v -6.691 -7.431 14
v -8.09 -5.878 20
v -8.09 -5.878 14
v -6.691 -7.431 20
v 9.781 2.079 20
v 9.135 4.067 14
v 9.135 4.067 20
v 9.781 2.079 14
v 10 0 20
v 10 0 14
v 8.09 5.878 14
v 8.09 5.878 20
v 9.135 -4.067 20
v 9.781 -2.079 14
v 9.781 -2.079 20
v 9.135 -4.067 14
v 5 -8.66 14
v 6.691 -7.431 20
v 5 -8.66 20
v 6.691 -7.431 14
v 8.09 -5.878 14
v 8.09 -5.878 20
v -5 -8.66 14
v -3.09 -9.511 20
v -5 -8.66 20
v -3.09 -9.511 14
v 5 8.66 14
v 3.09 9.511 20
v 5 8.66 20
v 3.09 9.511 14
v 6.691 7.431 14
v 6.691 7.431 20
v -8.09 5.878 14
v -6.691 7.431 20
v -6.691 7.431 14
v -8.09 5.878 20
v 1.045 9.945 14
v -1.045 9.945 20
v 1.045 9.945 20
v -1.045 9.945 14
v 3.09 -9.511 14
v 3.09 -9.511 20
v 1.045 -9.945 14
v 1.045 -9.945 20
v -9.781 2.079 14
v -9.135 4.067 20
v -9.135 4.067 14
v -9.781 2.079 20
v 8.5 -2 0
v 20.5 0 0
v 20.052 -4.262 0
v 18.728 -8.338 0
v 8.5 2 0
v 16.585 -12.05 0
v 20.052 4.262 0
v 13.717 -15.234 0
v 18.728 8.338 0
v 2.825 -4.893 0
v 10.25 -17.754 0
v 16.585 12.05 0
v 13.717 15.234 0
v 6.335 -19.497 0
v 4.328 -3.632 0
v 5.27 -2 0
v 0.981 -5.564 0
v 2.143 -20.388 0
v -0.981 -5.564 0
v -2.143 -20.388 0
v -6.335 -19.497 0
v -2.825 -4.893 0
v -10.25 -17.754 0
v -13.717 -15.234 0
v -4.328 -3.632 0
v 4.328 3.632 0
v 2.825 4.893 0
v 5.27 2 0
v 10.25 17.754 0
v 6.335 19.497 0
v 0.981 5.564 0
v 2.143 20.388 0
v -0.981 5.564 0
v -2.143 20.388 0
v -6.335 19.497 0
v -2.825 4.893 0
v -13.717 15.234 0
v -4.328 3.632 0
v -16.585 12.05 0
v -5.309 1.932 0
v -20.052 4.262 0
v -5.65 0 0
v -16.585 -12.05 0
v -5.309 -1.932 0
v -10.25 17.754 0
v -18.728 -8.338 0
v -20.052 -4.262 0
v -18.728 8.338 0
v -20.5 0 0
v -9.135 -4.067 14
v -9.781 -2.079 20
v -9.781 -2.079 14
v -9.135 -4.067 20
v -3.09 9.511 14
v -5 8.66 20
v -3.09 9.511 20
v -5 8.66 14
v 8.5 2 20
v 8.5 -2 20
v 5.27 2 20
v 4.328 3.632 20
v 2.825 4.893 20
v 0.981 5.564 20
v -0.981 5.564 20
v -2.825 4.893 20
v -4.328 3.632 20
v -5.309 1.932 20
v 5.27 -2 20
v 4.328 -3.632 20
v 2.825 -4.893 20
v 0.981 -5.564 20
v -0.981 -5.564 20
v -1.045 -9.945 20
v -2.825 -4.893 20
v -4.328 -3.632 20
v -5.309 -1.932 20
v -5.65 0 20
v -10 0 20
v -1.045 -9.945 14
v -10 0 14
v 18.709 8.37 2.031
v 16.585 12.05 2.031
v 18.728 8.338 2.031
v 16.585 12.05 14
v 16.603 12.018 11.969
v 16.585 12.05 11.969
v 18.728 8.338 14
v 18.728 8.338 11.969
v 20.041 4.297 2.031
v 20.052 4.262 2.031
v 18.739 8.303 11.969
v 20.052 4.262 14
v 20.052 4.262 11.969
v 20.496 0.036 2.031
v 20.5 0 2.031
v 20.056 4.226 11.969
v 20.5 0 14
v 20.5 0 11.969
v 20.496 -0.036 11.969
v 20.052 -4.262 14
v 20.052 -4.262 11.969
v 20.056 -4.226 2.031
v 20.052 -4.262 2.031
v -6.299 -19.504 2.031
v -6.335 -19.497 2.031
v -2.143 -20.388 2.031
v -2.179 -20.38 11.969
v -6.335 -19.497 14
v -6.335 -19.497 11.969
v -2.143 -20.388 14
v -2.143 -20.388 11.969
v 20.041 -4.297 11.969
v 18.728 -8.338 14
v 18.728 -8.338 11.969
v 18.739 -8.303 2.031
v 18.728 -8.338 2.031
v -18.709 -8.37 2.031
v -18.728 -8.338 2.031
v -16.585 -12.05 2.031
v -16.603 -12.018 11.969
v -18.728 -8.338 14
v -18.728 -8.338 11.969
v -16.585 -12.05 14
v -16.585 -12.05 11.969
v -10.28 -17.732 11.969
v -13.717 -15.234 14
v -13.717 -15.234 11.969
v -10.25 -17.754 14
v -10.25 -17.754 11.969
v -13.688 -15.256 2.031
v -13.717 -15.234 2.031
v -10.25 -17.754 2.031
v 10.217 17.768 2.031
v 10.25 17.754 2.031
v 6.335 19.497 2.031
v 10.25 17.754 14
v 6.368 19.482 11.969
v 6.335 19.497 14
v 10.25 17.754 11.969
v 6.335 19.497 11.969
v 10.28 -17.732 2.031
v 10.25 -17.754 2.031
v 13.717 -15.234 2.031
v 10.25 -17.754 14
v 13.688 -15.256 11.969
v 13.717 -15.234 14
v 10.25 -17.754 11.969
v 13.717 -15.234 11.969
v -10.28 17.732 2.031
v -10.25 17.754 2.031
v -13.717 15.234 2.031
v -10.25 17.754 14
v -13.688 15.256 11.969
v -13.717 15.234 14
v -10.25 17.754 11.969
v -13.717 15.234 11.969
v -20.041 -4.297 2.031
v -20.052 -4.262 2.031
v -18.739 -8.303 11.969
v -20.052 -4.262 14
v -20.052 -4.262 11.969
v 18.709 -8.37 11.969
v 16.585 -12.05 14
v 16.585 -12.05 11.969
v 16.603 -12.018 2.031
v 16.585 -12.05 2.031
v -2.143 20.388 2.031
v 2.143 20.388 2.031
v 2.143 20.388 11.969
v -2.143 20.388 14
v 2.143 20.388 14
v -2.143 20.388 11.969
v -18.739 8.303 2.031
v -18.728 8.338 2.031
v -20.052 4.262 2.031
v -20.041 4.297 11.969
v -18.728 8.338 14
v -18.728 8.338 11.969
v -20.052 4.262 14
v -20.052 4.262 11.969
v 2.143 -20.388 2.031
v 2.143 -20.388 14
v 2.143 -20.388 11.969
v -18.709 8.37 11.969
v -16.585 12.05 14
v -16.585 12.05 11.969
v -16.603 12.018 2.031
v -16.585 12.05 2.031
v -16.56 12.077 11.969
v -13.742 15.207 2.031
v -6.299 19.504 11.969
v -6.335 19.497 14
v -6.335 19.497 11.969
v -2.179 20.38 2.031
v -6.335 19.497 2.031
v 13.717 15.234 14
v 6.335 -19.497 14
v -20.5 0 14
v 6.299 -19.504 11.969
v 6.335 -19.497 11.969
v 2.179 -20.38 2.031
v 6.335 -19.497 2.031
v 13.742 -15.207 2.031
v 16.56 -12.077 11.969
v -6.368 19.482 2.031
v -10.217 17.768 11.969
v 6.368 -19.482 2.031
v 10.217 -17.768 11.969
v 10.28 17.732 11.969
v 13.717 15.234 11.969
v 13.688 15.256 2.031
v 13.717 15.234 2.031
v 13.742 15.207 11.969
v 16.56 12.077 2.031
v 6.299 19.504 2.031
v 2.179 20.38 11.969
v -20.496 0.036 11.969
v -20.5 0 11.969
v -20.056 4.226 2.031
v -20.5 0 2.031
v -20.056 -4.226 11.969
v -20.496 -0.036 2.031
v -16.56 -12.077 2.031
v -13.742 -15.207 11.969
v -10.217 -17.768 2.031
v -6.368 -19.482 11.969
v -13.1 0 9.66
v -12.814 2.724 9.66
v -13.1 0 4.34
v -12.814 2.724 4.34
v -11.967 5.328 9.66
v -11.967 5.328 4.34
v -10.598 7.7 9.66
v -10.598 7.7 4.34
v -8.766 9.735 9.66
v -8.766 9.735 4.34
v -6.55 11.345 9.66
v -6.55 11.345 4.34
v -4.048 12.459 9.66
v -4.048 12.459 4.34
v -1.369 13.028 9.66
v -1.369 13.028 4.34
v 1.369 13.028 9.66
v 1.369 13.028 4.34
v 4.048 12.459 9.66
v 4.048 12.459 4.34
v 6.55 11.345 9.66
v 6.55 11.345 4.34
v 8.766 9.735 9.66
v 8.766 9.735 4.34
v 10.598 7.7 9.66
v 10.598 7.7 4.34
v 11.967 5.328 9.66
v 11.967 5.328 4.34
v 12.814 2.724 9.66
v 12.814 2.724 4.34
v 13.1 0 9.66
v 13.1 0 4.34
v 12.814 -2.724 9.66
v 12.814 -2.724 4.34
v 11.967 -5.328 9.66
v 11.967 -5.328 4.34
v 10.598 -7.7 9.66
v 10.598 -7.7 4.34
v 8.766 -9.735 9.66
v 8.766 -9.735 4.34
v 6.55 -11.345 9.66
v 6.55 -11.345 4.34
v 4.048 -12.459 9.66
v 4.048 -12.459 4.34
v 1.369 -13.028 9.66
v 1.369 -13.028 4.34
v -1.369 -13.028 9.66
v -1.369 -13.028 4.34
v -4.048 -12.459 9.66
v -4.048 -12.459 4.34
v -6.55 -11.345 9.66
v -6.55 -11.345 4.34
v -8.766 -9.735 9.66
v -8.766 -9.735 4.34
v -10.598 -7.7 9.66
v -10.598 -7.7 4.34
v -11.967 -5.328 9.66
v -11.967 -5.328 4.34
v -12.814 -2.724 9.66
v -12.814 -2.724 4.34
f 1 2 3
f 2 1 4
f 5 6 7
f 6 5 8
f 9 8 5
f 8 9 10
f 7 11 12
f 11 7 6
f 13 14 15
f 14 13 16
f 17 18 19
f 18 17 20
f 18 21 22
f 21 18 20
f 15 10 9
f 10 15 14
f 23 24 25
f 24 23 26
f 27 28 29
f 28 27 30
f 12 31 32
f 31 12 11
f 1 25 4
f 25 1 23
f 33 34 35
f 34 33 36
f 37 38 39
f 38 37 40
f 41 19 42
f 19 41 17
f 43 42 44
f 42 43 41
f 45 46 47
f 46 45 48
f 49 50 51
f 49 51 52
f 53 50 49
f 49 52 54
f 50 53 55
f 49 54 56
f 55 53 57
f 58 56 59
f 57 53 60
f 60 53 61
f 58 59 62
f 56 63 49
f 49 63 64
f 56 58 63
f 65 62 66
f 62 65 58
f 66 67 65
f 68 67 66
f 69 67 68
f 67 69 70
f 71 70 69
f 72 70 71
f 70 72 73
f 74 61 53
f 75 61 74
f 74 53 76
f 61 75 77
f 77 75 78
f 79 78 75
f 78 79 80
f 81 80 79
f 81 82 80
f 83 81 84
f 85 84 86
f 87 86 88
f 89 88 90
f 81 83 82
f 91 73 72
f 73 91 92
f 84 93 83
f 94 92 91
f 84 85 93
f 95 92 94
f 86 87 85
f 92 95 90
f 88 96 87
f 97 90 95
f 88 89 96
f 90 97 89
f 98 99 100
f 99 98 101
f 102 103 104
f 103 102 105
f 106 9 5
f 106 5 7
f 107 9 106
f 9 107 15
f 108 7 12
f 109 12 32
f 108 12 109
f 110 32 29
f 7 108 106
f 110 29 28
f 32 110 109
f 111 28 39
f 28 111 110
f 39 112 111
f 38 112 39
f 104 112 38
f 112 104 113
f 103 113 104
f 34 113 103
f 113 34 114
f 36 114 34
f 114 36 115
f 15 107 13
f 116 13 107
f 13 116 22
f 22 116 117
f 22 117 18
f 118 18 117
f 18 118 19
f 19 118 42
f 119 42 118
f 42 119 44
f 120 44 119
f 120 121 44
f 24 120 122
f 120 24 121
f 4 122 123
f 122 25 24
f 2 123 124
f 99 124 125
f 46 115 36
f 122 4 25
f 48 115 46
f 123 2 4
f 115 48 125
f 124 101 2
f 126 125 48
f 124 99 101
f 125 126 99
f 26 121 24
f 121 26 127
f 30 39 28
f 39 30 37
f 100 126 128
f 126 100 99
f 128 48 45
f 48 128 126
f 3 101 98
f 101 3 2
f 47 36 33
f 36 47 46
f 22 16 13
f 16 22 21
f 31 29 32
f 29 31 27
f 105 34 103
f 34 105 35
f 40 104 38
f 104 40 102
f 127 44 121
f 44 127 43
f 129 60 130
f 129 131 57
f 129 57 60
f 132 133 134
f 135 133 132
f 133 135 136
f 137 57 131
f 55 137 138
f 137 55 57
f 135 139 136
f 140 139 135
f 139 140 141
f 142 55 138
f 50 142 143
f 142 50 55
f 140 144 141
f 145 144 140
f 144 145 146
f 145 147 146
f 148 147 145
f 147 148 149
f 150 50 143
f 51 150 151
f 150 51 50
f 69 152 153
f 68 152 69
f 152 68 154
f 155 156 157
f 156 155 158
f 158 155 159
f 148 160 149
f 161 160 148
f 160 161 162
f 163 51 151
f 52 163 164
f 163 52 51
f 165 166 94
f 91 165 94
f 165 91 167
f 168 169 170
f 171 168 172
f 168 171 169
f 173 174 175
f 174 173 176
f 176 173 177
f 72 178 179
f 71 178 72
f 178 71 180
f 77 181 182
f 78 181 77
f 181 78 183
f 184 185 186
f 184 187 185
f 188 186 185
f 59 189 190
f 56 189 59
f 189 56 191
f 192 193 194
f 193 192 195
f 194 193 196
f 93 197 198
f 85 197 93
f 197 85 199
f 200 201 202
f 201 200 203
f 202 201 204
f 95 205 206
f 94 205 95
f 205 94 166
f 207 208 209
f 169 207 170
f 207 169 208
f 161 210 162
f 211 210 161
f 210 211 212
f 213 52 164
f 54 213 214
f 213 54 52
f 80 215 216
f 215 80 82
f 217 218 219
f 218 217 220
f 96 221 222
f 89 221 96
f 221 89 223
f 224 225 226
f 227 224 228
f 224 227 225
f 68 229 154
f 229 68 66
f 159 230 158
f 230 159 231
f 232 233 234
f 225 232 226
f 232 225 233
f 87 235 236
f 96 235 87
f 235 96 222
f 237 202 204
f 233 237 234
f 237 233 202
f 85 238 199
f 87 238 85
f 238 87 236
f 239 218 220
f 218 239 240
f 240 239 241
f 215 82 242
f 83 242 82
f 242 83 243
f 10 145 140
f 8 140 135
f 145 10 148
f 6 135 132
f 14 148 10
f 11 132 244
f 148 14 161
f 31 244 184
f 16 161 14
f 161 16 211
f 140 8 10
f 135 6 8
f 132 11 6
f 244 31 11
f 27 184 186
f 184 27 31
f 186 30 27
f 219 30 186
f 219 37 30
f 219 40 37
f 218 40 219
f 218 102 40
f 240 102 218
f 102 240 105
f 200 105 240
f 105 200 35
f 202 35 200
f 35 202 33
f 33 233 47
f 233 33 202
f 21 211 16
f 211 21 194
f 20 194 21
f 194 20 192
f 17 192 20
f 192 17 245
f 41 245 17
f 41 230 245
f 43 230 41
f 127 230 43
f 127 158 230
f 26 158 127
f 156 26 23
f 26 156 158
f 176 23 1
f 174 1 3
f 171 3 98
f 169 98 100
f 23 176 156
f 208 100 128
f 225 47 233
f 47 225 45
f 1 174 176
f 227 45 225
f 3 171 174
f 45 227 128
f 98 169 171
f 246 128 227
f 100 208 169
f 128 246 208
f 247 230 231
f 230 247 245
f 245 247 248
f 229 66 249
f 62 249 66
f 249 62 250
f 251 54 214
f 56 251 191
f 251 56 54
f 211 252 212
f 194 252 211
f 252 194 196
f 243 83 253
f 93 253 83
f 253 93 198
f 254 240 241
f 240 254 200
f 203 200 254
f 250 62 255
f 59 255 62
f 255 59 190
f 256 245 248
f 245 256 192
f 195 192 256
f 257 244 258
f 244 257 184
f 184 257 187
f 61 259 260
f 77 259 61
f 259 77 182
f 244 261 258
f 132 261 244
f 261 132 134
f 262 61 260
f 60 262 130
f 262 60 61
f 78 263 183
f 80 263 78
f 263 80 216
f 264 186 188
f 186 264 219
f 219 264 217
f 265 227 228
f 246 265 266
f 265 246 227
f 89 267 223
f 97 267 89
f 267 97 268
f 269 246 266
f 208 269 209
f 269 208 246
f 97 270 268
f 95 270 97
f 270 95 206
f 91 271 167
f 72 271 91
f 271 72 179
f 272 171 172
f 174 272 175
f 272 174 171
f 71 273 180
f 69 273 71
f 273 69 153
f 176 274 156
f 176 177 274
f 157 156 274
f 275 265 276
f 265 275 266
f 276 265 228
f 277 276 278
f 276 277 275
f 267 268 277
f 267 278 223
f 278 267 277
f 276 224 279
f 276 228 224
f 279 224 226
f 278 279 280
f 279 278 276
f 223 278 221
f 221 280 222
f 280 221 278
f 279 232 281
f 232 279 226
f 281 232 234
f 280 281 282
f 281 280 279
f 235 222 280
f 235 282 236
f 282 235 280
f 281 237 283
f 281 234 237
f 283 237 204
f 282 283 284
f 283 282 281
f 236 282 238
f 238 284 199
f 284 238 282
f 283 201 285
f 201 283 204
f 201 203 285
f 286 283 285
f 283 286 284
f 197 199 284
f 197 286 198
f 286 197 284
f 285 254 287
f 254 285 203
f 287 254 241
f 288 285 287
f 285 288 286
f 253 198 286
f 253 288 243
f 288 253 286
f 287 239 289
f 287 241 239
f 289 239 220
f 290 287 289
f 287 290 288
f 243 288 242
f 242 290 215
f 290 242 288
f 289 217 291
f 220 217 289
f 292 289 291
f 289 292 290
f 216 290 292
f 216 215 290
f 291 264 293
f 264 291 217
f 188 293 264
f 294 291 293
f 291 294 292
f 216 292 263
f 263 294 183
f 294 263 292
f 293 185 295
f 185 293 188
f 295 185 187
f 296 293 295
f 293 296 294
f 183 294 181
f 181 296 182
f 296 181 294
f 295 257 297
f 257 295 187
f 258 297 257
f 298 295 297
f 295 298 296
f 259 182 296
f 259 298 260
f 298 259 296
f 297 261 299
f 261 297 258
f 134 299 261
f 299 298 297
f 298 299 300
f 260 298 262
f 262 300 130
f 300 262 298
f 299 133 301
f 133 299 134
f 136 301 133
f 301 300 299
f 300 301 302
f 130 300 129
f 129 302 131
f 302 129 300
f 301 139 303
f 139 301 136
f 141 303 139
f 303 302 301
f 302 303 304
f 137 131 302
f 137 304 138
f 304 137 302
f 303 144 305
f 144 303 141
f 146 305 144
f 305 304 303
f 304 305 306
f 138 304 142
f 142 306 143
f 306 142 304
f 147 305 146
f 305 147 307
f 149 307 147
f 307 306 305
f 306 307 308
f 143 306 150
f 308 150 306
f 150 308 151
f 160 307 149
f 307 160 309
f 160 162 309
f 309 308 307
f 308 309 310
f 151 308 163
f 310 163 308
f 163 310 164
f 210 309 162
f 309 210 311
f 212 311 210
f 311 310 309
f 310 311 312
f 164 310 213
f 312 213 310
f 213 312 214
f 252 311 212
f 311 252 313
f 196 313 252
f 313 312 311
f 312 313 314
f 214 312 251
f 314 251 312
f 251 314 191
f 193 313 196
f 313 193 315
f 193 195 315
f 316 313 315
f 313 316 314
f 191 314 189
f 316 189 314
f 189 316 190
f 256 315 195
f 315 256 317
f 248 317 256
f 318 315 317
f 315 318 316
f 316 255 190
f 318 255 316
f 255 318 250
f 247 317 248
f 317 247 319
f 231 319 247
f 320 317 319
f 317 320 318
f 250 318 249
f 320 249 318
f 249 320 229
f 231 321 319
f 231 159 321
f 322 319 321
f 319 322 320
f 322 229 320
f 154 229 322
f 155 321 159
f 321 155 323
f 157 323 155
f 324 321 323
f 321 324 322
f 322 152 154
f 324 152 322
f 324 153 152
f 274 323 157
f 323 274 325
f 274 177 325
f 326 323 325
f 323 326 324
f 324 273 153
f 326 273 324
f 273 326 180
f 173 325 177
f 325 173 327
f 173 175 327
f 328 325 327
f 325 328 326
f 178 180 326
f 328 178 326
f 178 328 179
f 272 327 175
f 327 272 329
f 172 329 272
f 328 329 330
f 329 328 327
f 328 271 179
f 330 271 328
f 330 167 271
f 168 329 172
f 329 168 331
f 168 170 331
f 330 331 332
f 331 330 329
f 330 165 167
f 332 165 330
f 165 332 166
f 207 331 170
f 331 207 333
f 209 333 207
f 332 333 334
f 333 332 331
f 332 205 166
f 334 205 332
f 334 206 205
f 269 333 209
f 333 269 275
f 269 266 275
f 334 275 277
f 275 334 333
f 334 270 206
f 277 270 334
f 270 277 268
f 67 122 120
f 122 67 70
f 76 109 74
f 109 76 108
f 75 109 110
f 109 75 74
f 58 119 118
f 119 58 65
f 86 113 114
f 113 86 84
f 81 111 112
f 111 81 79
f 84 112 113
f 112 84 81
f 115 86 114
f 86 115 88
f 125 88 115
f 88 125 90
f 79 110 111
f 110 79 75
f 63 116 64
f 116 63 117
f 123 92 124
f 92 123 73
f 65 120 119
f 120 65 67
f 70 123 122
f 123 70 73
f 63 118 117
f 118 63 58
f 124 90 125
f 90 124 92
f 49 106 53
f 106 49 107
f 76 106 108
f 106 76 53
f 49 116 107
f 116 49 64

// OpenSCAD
module profile()
{
    ang = 40;
    polygon(points=[[0,10*cos(ang)], [7.5,10], [7.5,0], [0,10-10*cos(ang)]]);
}


difference()
{
  union()
  {
    cylinder(d=20, h=20);
    cylinder(d=41, h=12+2);
  }

translate([0,0,2])
rotate_extrude(convexity=10)
translate([41/2-7.4,0,0])
//rotate([0,90,0])
//circle(r=5, $fn=4);
  profile();
  
  
  cylinder(d=11.3, h=25);
  
  translate([4.5,-2,0])
  cube([4,4,25]);
}
